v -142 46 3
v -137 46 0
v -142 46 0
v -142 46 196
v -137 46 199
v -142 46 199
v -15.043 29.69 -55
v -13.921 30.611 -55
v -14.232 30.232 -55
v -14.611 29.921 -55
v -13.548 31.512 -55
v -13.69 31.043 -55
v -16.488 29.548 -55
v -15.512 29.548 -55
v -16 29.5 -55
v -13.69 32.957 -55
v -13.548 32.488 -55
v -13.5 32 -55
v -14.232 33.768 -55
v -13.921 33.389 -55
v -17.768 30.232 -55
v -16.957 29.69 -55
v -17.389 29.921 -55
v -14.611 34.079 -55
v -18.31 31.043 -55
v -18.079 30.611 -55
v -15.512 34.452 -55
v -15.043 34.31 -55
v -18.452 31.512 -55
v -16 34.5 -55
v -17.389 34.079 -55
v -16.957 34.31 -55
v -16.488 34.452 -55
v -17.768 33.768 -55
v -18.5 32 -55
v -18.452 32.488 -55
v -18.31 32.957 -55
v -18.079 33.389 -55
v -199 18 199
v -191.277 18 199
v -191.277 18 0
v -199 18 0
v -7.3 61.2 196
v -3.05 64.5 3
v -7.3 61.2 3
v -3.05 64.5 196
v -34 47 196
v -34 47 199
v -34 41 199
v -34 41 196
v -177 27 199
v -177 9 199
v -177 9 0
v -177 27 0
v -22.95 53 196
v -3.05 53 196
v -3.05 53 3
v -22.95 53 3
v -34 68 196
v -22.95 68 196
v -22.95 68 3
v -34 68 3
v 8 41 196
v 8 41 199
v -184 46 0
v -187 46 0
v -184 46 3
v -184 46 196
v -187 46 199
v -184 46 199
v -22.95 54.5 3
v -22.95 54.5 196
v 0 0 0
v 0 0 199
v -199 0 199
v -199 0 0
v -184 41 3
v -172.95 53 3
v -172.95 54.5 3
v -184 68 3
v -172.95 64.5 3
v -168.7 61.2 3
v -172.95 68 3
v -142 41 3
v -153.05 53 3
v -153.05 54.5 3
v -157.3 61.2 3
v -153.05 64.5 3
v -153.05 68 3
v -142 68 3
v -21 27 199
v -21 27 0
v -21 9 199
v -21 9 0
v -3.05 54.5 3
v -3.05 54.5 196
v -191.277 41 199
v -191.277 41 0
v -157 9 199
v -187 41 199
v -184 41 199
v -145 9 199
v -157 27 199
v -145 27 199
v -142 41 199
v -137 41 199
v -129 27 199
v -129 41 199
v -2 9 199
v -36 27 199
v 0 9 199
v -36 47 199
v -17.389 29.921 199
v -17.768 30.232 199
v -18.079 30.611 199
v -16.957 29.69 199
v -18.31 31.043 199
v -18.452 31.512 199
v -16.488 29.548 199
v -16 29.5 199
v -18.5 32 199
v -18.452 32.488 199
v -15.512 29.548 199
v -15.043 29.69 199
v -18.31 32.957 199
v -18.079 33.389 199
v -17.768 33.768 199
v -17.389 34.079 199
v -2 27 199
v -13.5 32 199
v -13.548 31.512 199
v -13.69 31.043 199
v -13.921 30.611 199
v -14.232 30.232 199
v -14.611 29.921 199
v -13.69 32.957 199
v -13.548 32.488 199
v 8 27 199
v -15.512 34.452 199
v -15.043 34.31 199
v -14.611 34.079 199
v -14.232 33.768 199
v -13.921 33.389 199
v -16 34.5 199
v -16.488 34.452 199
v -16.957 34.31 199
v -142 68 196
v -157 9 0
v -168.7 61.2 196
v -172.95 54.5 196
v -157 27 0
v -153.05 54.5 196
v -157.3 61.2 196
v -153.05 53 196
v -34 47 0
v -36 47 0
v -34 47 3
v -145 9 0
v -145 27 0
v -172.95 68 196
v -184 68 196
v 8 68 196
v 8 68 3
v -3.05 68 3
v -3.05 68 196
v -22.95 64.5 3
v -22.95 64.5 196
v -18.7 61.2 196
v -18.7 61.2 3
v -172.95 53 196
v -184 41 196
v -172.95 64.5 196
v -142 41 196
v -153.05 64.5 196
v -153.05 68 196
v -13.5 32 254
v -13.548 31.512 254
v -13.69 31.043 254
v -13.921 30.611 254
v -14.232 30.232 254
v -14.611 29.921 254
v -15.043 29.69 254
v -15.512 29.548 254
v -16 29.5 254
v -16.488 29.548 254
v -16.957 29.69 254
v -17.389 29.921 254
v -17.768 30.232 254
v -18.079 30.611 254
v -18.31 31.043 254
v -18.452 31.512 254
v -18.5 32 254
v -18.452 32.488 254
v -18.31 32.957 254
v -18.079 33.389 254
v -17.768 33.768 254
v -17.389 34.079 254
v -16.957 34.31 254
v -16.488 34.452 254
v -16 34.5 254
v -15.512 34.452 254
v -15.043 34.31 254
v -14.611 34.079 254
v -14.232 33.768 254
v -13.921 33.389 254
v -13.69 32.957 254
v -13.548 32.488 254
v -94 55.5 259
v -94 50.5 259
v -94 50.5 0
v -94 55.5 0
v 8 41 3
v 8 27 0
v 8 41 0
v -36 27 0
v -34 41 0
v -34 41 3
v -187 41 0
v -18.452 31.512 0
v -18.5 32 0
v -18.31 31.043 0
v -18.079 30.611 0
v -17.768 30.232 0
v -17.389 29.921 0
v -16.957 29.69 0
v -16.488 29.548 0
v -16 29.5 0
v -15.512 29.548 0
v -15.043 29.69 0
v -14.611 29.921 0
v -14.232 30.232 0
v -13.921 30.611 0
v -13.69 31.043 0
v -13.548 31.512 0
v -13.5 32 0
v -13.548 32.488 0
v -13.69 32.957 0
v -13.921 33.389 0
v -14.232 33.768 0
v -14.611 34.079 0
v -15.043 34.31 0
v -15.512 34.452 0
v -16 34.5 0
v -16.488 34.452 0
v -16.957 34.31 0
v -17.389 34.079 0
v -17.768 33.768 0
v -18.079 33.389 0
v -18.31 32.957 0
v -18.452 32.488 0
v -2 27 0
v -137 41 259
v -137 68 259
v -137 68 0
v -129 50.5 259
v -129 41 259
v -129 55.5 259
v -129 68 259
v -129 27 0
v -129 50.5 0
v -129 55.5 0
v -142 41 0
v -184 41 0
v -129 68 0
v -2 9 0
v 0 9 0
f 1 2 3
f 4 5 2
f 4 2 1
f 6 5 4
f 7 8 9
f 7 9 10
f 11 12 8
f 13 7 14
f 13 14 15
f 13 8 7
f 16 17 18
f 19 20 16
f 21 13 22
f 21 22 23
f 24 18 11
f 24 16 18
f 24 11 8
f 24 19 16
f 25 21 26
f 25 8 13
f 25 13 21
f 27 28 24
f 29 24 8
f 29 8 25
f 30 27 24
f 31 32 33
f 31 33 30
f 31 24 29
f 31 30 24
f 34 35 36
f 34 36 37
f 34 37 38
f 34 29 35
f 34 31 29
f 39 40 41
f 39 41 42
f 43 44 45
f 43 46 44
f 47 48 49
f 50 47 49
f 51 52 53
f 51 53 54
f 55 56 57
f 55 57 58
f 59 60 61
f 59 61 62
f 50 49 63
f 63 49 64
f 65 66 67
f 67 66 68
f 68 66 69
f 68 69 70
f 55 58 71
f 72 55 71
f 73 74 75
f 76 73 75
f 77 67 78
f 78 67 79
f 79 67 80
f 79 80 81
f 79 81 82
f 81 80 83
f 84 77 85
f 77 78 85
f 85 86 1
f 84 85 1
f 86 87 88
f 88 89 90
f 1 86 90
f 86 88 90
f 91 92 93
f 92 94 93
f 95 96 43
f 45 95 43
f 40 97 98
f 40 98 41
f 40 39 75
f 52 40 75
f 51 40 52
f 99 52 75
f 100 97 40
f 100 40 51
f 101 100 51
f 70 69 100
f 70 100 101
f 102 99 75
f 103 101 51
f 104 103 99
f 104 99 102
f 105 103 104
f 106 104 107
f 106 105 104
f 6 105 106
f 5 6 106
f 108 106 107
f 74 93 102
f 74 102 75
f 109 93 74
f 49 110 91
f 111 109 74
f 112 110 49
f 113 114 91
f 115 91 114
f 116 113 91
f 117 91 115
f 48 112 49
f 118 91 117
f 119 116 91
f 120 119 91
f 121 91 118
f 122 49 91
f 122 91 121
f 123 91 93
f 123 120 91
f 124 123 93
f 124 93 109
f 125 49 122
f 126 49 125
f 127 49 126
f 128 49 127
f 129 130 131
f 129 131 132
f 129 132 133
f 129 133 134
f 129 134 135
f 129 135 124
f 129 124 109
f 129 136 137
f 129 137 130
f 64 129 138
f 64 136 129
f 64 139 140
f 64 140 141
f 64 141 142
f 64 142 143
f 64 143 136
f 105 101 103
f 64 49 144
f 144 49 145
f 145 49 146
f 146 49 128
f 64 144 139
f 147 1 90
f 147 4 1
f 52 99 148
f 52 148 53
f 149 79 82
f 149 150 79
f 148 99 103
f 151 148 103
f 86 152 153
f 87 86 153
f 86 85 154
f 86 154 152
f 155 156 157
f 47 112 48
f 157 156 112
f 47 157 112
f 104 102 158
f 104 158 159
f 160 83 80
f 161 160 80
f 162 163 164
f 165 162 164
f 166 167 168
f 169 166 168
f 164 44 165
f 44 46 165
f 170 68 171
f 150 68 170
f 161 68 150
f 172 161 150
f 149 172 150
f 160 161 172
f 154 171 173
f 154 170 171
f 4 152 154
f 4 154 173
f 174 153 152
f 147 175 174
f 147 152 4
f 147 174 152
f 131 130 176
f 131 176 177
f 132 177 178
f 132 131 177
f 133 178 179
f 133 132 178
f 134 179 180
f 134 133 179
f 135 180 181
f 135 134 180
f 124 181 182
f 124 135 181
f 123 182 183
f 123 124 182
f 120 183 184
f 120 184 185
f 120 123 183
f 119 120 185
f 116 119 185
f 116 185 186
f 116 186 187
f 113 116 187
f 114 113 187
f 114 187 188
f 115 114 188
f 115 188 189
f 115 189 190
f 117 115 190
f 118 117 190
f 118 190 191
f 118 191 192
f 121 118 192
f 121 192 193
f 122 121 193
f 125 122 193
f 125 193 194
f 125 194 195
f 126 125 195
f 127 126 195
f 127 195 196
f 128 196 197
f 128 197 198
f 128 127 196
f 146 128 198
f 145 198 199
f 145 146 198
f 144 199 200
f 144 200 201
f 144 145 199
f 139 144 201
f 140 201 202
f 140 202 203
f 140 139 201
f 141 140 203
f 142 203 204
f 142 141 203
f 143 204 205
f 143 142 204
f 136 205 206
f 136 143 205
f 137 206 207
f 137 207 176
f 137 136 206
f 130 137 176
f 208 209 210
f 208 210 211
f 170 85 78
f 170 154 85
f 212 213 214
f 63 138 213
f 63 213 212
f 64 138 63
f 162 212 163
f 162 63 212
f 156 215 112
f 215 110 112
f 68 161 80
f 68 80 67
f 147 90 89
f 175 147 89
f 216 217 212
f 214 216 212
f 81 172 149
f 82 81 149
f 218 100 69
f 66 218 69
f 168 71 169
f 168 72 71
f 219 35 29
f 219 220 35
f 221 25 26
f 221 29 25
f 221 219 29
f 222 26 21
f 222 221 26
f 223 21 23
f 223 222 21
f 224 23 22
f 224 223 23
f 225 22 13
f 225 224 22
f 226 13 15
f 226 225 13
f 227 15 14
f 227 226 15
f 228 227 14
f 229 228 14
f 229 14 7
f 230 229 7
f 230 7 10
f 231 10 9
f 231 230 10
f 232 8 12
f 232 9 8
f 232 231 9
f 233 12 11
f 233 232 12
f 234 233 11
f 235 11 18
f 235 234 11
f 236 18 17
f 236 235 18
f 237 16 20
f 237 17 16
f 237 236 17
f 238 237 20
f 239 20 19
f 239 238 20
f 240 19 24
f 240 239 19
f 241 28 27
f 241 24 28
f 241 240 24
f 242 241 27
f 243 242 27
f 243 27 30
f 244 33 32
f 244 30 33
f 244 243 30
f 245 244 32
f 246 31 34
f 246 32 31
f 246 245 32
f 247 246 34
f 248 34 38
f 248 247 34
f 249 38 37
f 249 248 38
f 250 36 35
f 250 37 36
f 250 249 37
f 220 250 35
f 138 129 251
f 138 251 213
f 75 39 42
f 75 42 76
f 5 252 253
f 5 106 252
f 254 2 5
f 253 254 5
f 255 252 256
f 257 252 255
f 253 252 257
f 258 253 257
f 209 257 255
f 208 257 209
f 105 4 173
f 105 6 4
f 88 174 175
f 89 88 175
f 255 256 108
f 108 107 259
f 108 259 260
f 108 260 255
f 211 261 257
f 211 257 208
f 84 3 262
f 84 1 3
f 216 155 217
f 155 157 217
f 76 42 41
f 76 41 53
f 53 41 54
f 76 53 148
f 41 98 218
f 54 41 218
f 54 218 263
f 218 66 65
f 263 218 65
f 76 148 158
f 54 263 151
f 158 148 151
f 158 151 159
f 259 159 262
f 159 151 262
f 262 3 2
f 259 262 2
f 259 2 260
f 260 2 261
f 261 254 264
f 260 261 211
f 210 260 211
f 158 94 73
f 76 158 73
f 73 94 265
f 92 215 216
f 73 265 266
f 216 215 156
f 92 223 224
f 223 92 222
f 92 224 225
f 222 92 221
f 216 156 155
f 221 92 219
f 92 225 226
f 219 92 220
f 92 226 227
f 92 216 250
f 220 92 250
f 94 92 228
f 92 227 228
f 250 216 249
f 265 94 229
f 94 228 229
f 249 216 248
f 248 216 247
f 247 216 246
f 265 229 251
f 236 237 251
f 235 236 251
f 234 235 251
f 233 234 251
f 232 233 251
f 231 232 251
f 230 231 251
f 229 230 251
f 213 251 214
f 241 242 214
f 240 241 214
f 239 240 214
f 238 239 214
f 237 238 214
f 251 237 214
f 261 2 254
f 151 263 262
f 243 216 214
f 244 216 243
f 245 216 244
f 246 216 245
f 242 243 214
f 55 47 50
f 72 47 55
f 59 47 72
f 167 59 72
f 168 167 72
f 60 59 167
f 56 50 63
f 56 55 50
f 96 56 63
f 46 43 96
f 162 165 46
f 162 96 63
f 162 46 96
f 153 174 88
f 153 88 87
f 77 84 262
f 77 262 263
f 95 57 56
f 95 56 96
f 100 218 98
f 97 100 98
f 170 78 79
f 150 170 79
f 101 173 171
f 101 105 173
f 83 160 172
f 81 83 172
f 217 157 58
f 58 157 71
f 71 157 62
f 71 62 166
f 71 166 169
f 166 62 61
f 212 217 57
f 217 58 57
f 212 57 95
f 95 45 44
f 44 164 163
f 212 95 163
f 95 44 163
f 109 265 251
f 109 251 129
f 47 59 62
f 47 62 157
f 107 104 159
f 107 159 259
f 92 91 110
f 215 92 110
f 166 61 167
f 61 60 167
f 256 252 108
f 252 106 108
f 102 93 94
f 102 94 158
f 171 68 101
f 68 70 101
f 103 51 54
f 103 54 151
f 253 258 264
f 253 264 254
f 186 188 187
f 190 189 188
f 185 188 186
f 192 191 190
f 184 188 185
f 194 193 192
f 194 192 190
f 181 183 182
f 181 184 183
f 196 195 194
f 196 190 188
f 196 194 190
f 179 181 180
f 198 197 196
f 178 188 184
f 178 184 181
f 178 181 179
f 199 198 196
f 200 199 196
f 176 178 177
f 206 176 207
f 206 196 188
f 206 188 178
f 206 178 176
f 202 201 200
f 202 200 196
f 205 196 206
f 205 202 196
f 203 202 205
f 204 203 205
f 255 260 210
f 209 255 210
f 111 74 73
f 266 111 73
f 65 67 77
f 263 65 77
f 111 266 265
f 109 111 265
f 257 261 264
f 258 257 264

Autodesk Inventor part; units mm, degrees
ref_plane "YZ Plane" through (0, 0, 0) normal (1, 0, 0) x (0, 1, 0)
ref_plane "XZ Plane" through (0, 0, 0) normal (0, 1, 0) x (-1, 0, 0)
sketch "Sketch1" plane through (0, 0, 0) normal (0, 1, 0) x (-1, 0, 0)
  line L0 (0, 0) -> (199, 0)
  line L1 (199, 0) -> (199, 199)
  line L2 (199, 199) -> (0, 199)
  line L3 (0, 199) -> (0, 0)
  dimension "d0" = 199
  dimension "d1" = 199
extrude "Extrusion1" add sketch "Sketch1" along normal blind 9
sketch "Sketch2" plane through (0, 9, 0) normal (0, 1, 0) x (1, 0, 0)
  line L0 (0, 0) -> (-199, 0) projected
  line L1 (-199, -199) -> (0, -199) projected
  line L2 (0, 0) -> (-2, 0)
  line L3 (-2, 0) -> (-2, -199)
  line L4 (-2, 0) -> (-21, 0)
  line L5 (-21, 0) -> (-21, -199)
  dimension "d4" = 2
  dimension "d5" = 19
extrude "Extrusion2" add sketch "Sketch2" along normal blind 18
sketch "Sketch4" plane through (-199, 0, 199) normal (0, 0, 1) x (1, 0, 0)
  line L0 (178, 27) -> (197, 27) projected
  line L1 (197, 27) -> (207, 27)
  line L2 (207, 27) -> (207, 41)
  line L3 (178, 27) -> (163, 27)
  line L4 (163, 27) -> (163, 47)
  line L5 (163, 47) -> (165, 47)
  line L6 (165, 47) -> (165, 41)
  line L7 (165, 41) -> (207, 41)
  dimension "d9" = 10
  dimension "d10" = 14
  dimension "d11" = 15
  dimension "d12" = 20
  dimension "d13" = 2
extrude "Extrusion3" add sketch "Sketch4" against normal blind 199
ref_plane "Work Plane1" through (-199, 0, 196) normal (0, 0, 1) x (1, 0, 0)
sketch "Sketch5" plane through (-199, 0, 196) normal (0, 0, 1) x (1, 0, 0)
  line L0 (165, 41) -> (207, 41)
  line L1 (207, 41) -> (207, 68)
  line L2 (165, 68) -> (165, 41)
  line L3 (176.05, 68) -> (176.05, 64.5)
  line L4 (176.05, 64.5) -> (180.3, 61.2)
  line L5 (195.95, 64.5) -> (191.7, 61.2)
  line L6 (195.95, 64.5) -> (195.95, 68)
  line L7 (195.95, 53) -> (195.95, 54.5)
  line L8 (195.95, 54.5) -> (191.7, 61.2)
  line L9 (176.05, 54.5) -> (180.3, 61.2)
  line L10 (176.05, 53) -> (176.05, 54.5)
  line L11 (195.95, 53) -> (176.05, 53)
  line L12 (207, 68) -> (195.95, 68)
  line L13 (207, 68) -> (195.95, 68)
  line L14 (176.05, 68) -> (165, 68)
  line L15 (15, 41) -> (57, 41)
  line L16 (57, 41) -> (57, 68)
  line L17 (15, 68) -> (15, 41)
  line L18 (26.05, 68) -> (26.05, 64.5)
  line L19 (26.05, 64.5) -> (30.3, 61.2)
  line L20 (45.95, 64.5) -> (41.7, 61.2)
  line L21 (45.95, 64.5) -> (45.95, 68)
  line L22 (45.95, 53) -> (45.95, 54.5)
  line L23 (45.95, 54.5) -> (41.7, 61.2)
  line L24 (26.05, 54.5) -> (30.3, 61.2)
  line L25 (26.05, 53) -> (26.05, 54.5)
  line L26 (45.95, 53) -> (26.05, 53)
  line L27 (57, 68) -> (45.95, 68)
  line L28 (57, 68) -> (45.95, 68)
  line L29 (26.05, 68) -> (15, 68)
  line L30 (0, 9) -> (178, 9) projected
  point P0 (199, 0)
  point P1 (176.05, 51)
  point P2 (26.05, 51)
  dimension "d17" = 27
  dimension "d18" = 1.5
  dimension "d19" = 1.5
  dimension "d20" = 11.05
  dimension "d32" = 27
  dimension "d33" = 1.5
  dimension "d34" = 1.5
  dimension "d35" = 11.05
  dimension "d56" = 32
extrude "Extrusion4" add sketch "Sketch5" against normal blind 193 contours L2 L14 L3 L4 L9 L10 L11 L7 L8 L5 L6 L12 L1 L0
sketch "Sketch6" plane through (-199, 0, 199) normal (0, 0, 1) x (1, 0, 0)
  line L0 (0, 9) -> (178, 9) projected
  line L1 (0, 9) -> (22, 9)
  line L2 (22, 9) -> (22, 18)
  line L3 (7.723, 18) -> (0, 18)
  line L4 (0, 18) -> (0, 9)
  line L5 (22, 18) -> (22, 27)
  line L6 (22, 41) -> (7.723, 41)
  line L7 (7.723, 41) -> (7.723, 18)
  line L8 (70, 27) -> (70, 41)
  line L9 (70, 41) -> (22, 41)
  line L10 (54, 9) -> (54, 27)
  line L11 (42, 9) -> (42, 27)
  line L12 (22, 27) -> (42, 27)
  line L13 (54, 27) -> (70, 27)
  line L14 (0, 9) -> (22, 9)
  line L15 (42, 9) -> (54, 9)
  dimension "d29" = 20
  dimension "d55" = 14
  dimension "d57" = 18
extrude "Extrusion5" add sketch "Sketch6" against normal blind 199 contours L4 L3 L7 L6 L9 L8 L13 L10 L0 L11 L12 L5 L2
sketch "Sketch8" plane through (-199, 0, 196) normal (0, 0, 1) x (1, 0, 0)
  line L0 (207, 41) -> (165, 41) projected
  line L1 (207, 41) -> (207, 68) projected
  line L2 (207, 68) -> (195.95, 68) projected
  line L3 (195.95, 68) -> (195.95, 64.5) projected
  line L4 (195.95, 64.5) -> (191.7, 61.2) projected
  line L5 (191.7, 61.2) -> (195.95, 54.5) projected
  line L6 (195.95, 54.5) -> (195.95, 53) projected
  line L7 (195.95, 53) -> (176.05, 53) projected
  line L8 (176.05, 53) -> (176.05, 54.5) projected
  line L9 (176.05, 54.5) -> (180.3, 61.2) projected
  line L10 (180.3, 61.2) -> (176.05, 64.5) projected
  line L11 (176.05, 64.5) -> (176.05, 68) projected
  line L12 (176.05, 68) -> (165, 68) projected
  line L13 (165, 68) -> (165, 47) projected
  line L14 (165, 41) -> (165, 47) projected
  line L15 (7.723, 41) -> (70, 41) projected
  point P0 (199, 0)
extrude "Extrusion6" add sketch "Sketch5" against normal blind 193 contours L17 L29 L18 L19 L24 L25 L26 L22 L23 L20 L21 L27 L16 L15
sketch "Sketch9" plane through (-199, 0, 199) normal (0, 0, 1) x (1, 0, 0)
  line L0 (70, 41) -> (7.723, 41) projected
  line L1 (57, 41) -> (62, 41)
  line L2 (62, 41) -> (62, 46)
  line L3 (62, 46) -> (57, 46)
  line L4 (57, 46) -> (57, 41)
  line L5 (15, 41) -> (12, 41)
  line L6 (12, 41) -> (12, 46)
  line L7 (12, 46) -> (15, 46)
  line L8 (15, 46) -> (15, 41)
  dimension "d38" = 5
  dimension "d39" = 3
extrude "Extrusion7" add sketch "Sketch9" against normal blind 199
sketch "Sketch10" plane through (-199, 0, 199) normal (0, 0, 1) x (1, 0, 0)
  line L0 (62, 41) -> (62, 46) projected
  line L1 (62, 41) -> (70, 41)
  line L2 (70, 68) -> (62, 68)
  line L3 (62, 68) -> (62, 41)
  line L4 (70, 55.5) -> (105, 55.5)
  line L5 (70, 55.5) -> (105, 55.5)
  line L6 (70, 50.5) -> (105, 50.5)
  line L7 (70, 50.5) -> (105, 50.5)
  line L8 (70, 50.5) -> (105, 50.5)
  line L9 (105, 50.5) -> (105, 55.5)
  line L10 (105, 55.5) -> (70, 55.5)
  line L11 (70, 37) -> (70, 50.5)
  line L12 (70, 55.5) -> (70, 68)
  line L13 (70, 41) -> (70, 50.5)
  line L14 (70, 55.5) -> (70, 68)
  point P0 (0, 0)
  dimension "d42" = 35
  dimension "d59" = 27
  dimension "d60" = 12.5
  dimension "d61" = 5
extrude "Extrusion8" add sketch "Sketch10" against normal blind 199
extrude "Extrusion9" add sketch "Sketch10" along normal blind 60
sketch "Sketch11" plane through (-199, 0, 199) normal (0, 0, 1) x (1, 0, 0)
  line L0 (178, 27) -> (183, 27)
  line L1 (183, 27) -> (183, 32)
  circle A0 centre (183, 32) radius 2.5
  dimension "d47" = 5
  dimension "d50" = 5
extrude "Extrusion10" add sketch "Sketch11" along normal blind 55
sketch "Sketch12" plane through (0, 0, 0) normal (0, 0, -1) x (-1, 0, 0)
  circle A0 centre (16, 32) radius 2.5 projected
  circle A1 centre (16, 32) radius 2.5
extrude "Extrusion11" add sketch "Sketch12" along normal blind 55
properties part number "Platform" material "Steel"
